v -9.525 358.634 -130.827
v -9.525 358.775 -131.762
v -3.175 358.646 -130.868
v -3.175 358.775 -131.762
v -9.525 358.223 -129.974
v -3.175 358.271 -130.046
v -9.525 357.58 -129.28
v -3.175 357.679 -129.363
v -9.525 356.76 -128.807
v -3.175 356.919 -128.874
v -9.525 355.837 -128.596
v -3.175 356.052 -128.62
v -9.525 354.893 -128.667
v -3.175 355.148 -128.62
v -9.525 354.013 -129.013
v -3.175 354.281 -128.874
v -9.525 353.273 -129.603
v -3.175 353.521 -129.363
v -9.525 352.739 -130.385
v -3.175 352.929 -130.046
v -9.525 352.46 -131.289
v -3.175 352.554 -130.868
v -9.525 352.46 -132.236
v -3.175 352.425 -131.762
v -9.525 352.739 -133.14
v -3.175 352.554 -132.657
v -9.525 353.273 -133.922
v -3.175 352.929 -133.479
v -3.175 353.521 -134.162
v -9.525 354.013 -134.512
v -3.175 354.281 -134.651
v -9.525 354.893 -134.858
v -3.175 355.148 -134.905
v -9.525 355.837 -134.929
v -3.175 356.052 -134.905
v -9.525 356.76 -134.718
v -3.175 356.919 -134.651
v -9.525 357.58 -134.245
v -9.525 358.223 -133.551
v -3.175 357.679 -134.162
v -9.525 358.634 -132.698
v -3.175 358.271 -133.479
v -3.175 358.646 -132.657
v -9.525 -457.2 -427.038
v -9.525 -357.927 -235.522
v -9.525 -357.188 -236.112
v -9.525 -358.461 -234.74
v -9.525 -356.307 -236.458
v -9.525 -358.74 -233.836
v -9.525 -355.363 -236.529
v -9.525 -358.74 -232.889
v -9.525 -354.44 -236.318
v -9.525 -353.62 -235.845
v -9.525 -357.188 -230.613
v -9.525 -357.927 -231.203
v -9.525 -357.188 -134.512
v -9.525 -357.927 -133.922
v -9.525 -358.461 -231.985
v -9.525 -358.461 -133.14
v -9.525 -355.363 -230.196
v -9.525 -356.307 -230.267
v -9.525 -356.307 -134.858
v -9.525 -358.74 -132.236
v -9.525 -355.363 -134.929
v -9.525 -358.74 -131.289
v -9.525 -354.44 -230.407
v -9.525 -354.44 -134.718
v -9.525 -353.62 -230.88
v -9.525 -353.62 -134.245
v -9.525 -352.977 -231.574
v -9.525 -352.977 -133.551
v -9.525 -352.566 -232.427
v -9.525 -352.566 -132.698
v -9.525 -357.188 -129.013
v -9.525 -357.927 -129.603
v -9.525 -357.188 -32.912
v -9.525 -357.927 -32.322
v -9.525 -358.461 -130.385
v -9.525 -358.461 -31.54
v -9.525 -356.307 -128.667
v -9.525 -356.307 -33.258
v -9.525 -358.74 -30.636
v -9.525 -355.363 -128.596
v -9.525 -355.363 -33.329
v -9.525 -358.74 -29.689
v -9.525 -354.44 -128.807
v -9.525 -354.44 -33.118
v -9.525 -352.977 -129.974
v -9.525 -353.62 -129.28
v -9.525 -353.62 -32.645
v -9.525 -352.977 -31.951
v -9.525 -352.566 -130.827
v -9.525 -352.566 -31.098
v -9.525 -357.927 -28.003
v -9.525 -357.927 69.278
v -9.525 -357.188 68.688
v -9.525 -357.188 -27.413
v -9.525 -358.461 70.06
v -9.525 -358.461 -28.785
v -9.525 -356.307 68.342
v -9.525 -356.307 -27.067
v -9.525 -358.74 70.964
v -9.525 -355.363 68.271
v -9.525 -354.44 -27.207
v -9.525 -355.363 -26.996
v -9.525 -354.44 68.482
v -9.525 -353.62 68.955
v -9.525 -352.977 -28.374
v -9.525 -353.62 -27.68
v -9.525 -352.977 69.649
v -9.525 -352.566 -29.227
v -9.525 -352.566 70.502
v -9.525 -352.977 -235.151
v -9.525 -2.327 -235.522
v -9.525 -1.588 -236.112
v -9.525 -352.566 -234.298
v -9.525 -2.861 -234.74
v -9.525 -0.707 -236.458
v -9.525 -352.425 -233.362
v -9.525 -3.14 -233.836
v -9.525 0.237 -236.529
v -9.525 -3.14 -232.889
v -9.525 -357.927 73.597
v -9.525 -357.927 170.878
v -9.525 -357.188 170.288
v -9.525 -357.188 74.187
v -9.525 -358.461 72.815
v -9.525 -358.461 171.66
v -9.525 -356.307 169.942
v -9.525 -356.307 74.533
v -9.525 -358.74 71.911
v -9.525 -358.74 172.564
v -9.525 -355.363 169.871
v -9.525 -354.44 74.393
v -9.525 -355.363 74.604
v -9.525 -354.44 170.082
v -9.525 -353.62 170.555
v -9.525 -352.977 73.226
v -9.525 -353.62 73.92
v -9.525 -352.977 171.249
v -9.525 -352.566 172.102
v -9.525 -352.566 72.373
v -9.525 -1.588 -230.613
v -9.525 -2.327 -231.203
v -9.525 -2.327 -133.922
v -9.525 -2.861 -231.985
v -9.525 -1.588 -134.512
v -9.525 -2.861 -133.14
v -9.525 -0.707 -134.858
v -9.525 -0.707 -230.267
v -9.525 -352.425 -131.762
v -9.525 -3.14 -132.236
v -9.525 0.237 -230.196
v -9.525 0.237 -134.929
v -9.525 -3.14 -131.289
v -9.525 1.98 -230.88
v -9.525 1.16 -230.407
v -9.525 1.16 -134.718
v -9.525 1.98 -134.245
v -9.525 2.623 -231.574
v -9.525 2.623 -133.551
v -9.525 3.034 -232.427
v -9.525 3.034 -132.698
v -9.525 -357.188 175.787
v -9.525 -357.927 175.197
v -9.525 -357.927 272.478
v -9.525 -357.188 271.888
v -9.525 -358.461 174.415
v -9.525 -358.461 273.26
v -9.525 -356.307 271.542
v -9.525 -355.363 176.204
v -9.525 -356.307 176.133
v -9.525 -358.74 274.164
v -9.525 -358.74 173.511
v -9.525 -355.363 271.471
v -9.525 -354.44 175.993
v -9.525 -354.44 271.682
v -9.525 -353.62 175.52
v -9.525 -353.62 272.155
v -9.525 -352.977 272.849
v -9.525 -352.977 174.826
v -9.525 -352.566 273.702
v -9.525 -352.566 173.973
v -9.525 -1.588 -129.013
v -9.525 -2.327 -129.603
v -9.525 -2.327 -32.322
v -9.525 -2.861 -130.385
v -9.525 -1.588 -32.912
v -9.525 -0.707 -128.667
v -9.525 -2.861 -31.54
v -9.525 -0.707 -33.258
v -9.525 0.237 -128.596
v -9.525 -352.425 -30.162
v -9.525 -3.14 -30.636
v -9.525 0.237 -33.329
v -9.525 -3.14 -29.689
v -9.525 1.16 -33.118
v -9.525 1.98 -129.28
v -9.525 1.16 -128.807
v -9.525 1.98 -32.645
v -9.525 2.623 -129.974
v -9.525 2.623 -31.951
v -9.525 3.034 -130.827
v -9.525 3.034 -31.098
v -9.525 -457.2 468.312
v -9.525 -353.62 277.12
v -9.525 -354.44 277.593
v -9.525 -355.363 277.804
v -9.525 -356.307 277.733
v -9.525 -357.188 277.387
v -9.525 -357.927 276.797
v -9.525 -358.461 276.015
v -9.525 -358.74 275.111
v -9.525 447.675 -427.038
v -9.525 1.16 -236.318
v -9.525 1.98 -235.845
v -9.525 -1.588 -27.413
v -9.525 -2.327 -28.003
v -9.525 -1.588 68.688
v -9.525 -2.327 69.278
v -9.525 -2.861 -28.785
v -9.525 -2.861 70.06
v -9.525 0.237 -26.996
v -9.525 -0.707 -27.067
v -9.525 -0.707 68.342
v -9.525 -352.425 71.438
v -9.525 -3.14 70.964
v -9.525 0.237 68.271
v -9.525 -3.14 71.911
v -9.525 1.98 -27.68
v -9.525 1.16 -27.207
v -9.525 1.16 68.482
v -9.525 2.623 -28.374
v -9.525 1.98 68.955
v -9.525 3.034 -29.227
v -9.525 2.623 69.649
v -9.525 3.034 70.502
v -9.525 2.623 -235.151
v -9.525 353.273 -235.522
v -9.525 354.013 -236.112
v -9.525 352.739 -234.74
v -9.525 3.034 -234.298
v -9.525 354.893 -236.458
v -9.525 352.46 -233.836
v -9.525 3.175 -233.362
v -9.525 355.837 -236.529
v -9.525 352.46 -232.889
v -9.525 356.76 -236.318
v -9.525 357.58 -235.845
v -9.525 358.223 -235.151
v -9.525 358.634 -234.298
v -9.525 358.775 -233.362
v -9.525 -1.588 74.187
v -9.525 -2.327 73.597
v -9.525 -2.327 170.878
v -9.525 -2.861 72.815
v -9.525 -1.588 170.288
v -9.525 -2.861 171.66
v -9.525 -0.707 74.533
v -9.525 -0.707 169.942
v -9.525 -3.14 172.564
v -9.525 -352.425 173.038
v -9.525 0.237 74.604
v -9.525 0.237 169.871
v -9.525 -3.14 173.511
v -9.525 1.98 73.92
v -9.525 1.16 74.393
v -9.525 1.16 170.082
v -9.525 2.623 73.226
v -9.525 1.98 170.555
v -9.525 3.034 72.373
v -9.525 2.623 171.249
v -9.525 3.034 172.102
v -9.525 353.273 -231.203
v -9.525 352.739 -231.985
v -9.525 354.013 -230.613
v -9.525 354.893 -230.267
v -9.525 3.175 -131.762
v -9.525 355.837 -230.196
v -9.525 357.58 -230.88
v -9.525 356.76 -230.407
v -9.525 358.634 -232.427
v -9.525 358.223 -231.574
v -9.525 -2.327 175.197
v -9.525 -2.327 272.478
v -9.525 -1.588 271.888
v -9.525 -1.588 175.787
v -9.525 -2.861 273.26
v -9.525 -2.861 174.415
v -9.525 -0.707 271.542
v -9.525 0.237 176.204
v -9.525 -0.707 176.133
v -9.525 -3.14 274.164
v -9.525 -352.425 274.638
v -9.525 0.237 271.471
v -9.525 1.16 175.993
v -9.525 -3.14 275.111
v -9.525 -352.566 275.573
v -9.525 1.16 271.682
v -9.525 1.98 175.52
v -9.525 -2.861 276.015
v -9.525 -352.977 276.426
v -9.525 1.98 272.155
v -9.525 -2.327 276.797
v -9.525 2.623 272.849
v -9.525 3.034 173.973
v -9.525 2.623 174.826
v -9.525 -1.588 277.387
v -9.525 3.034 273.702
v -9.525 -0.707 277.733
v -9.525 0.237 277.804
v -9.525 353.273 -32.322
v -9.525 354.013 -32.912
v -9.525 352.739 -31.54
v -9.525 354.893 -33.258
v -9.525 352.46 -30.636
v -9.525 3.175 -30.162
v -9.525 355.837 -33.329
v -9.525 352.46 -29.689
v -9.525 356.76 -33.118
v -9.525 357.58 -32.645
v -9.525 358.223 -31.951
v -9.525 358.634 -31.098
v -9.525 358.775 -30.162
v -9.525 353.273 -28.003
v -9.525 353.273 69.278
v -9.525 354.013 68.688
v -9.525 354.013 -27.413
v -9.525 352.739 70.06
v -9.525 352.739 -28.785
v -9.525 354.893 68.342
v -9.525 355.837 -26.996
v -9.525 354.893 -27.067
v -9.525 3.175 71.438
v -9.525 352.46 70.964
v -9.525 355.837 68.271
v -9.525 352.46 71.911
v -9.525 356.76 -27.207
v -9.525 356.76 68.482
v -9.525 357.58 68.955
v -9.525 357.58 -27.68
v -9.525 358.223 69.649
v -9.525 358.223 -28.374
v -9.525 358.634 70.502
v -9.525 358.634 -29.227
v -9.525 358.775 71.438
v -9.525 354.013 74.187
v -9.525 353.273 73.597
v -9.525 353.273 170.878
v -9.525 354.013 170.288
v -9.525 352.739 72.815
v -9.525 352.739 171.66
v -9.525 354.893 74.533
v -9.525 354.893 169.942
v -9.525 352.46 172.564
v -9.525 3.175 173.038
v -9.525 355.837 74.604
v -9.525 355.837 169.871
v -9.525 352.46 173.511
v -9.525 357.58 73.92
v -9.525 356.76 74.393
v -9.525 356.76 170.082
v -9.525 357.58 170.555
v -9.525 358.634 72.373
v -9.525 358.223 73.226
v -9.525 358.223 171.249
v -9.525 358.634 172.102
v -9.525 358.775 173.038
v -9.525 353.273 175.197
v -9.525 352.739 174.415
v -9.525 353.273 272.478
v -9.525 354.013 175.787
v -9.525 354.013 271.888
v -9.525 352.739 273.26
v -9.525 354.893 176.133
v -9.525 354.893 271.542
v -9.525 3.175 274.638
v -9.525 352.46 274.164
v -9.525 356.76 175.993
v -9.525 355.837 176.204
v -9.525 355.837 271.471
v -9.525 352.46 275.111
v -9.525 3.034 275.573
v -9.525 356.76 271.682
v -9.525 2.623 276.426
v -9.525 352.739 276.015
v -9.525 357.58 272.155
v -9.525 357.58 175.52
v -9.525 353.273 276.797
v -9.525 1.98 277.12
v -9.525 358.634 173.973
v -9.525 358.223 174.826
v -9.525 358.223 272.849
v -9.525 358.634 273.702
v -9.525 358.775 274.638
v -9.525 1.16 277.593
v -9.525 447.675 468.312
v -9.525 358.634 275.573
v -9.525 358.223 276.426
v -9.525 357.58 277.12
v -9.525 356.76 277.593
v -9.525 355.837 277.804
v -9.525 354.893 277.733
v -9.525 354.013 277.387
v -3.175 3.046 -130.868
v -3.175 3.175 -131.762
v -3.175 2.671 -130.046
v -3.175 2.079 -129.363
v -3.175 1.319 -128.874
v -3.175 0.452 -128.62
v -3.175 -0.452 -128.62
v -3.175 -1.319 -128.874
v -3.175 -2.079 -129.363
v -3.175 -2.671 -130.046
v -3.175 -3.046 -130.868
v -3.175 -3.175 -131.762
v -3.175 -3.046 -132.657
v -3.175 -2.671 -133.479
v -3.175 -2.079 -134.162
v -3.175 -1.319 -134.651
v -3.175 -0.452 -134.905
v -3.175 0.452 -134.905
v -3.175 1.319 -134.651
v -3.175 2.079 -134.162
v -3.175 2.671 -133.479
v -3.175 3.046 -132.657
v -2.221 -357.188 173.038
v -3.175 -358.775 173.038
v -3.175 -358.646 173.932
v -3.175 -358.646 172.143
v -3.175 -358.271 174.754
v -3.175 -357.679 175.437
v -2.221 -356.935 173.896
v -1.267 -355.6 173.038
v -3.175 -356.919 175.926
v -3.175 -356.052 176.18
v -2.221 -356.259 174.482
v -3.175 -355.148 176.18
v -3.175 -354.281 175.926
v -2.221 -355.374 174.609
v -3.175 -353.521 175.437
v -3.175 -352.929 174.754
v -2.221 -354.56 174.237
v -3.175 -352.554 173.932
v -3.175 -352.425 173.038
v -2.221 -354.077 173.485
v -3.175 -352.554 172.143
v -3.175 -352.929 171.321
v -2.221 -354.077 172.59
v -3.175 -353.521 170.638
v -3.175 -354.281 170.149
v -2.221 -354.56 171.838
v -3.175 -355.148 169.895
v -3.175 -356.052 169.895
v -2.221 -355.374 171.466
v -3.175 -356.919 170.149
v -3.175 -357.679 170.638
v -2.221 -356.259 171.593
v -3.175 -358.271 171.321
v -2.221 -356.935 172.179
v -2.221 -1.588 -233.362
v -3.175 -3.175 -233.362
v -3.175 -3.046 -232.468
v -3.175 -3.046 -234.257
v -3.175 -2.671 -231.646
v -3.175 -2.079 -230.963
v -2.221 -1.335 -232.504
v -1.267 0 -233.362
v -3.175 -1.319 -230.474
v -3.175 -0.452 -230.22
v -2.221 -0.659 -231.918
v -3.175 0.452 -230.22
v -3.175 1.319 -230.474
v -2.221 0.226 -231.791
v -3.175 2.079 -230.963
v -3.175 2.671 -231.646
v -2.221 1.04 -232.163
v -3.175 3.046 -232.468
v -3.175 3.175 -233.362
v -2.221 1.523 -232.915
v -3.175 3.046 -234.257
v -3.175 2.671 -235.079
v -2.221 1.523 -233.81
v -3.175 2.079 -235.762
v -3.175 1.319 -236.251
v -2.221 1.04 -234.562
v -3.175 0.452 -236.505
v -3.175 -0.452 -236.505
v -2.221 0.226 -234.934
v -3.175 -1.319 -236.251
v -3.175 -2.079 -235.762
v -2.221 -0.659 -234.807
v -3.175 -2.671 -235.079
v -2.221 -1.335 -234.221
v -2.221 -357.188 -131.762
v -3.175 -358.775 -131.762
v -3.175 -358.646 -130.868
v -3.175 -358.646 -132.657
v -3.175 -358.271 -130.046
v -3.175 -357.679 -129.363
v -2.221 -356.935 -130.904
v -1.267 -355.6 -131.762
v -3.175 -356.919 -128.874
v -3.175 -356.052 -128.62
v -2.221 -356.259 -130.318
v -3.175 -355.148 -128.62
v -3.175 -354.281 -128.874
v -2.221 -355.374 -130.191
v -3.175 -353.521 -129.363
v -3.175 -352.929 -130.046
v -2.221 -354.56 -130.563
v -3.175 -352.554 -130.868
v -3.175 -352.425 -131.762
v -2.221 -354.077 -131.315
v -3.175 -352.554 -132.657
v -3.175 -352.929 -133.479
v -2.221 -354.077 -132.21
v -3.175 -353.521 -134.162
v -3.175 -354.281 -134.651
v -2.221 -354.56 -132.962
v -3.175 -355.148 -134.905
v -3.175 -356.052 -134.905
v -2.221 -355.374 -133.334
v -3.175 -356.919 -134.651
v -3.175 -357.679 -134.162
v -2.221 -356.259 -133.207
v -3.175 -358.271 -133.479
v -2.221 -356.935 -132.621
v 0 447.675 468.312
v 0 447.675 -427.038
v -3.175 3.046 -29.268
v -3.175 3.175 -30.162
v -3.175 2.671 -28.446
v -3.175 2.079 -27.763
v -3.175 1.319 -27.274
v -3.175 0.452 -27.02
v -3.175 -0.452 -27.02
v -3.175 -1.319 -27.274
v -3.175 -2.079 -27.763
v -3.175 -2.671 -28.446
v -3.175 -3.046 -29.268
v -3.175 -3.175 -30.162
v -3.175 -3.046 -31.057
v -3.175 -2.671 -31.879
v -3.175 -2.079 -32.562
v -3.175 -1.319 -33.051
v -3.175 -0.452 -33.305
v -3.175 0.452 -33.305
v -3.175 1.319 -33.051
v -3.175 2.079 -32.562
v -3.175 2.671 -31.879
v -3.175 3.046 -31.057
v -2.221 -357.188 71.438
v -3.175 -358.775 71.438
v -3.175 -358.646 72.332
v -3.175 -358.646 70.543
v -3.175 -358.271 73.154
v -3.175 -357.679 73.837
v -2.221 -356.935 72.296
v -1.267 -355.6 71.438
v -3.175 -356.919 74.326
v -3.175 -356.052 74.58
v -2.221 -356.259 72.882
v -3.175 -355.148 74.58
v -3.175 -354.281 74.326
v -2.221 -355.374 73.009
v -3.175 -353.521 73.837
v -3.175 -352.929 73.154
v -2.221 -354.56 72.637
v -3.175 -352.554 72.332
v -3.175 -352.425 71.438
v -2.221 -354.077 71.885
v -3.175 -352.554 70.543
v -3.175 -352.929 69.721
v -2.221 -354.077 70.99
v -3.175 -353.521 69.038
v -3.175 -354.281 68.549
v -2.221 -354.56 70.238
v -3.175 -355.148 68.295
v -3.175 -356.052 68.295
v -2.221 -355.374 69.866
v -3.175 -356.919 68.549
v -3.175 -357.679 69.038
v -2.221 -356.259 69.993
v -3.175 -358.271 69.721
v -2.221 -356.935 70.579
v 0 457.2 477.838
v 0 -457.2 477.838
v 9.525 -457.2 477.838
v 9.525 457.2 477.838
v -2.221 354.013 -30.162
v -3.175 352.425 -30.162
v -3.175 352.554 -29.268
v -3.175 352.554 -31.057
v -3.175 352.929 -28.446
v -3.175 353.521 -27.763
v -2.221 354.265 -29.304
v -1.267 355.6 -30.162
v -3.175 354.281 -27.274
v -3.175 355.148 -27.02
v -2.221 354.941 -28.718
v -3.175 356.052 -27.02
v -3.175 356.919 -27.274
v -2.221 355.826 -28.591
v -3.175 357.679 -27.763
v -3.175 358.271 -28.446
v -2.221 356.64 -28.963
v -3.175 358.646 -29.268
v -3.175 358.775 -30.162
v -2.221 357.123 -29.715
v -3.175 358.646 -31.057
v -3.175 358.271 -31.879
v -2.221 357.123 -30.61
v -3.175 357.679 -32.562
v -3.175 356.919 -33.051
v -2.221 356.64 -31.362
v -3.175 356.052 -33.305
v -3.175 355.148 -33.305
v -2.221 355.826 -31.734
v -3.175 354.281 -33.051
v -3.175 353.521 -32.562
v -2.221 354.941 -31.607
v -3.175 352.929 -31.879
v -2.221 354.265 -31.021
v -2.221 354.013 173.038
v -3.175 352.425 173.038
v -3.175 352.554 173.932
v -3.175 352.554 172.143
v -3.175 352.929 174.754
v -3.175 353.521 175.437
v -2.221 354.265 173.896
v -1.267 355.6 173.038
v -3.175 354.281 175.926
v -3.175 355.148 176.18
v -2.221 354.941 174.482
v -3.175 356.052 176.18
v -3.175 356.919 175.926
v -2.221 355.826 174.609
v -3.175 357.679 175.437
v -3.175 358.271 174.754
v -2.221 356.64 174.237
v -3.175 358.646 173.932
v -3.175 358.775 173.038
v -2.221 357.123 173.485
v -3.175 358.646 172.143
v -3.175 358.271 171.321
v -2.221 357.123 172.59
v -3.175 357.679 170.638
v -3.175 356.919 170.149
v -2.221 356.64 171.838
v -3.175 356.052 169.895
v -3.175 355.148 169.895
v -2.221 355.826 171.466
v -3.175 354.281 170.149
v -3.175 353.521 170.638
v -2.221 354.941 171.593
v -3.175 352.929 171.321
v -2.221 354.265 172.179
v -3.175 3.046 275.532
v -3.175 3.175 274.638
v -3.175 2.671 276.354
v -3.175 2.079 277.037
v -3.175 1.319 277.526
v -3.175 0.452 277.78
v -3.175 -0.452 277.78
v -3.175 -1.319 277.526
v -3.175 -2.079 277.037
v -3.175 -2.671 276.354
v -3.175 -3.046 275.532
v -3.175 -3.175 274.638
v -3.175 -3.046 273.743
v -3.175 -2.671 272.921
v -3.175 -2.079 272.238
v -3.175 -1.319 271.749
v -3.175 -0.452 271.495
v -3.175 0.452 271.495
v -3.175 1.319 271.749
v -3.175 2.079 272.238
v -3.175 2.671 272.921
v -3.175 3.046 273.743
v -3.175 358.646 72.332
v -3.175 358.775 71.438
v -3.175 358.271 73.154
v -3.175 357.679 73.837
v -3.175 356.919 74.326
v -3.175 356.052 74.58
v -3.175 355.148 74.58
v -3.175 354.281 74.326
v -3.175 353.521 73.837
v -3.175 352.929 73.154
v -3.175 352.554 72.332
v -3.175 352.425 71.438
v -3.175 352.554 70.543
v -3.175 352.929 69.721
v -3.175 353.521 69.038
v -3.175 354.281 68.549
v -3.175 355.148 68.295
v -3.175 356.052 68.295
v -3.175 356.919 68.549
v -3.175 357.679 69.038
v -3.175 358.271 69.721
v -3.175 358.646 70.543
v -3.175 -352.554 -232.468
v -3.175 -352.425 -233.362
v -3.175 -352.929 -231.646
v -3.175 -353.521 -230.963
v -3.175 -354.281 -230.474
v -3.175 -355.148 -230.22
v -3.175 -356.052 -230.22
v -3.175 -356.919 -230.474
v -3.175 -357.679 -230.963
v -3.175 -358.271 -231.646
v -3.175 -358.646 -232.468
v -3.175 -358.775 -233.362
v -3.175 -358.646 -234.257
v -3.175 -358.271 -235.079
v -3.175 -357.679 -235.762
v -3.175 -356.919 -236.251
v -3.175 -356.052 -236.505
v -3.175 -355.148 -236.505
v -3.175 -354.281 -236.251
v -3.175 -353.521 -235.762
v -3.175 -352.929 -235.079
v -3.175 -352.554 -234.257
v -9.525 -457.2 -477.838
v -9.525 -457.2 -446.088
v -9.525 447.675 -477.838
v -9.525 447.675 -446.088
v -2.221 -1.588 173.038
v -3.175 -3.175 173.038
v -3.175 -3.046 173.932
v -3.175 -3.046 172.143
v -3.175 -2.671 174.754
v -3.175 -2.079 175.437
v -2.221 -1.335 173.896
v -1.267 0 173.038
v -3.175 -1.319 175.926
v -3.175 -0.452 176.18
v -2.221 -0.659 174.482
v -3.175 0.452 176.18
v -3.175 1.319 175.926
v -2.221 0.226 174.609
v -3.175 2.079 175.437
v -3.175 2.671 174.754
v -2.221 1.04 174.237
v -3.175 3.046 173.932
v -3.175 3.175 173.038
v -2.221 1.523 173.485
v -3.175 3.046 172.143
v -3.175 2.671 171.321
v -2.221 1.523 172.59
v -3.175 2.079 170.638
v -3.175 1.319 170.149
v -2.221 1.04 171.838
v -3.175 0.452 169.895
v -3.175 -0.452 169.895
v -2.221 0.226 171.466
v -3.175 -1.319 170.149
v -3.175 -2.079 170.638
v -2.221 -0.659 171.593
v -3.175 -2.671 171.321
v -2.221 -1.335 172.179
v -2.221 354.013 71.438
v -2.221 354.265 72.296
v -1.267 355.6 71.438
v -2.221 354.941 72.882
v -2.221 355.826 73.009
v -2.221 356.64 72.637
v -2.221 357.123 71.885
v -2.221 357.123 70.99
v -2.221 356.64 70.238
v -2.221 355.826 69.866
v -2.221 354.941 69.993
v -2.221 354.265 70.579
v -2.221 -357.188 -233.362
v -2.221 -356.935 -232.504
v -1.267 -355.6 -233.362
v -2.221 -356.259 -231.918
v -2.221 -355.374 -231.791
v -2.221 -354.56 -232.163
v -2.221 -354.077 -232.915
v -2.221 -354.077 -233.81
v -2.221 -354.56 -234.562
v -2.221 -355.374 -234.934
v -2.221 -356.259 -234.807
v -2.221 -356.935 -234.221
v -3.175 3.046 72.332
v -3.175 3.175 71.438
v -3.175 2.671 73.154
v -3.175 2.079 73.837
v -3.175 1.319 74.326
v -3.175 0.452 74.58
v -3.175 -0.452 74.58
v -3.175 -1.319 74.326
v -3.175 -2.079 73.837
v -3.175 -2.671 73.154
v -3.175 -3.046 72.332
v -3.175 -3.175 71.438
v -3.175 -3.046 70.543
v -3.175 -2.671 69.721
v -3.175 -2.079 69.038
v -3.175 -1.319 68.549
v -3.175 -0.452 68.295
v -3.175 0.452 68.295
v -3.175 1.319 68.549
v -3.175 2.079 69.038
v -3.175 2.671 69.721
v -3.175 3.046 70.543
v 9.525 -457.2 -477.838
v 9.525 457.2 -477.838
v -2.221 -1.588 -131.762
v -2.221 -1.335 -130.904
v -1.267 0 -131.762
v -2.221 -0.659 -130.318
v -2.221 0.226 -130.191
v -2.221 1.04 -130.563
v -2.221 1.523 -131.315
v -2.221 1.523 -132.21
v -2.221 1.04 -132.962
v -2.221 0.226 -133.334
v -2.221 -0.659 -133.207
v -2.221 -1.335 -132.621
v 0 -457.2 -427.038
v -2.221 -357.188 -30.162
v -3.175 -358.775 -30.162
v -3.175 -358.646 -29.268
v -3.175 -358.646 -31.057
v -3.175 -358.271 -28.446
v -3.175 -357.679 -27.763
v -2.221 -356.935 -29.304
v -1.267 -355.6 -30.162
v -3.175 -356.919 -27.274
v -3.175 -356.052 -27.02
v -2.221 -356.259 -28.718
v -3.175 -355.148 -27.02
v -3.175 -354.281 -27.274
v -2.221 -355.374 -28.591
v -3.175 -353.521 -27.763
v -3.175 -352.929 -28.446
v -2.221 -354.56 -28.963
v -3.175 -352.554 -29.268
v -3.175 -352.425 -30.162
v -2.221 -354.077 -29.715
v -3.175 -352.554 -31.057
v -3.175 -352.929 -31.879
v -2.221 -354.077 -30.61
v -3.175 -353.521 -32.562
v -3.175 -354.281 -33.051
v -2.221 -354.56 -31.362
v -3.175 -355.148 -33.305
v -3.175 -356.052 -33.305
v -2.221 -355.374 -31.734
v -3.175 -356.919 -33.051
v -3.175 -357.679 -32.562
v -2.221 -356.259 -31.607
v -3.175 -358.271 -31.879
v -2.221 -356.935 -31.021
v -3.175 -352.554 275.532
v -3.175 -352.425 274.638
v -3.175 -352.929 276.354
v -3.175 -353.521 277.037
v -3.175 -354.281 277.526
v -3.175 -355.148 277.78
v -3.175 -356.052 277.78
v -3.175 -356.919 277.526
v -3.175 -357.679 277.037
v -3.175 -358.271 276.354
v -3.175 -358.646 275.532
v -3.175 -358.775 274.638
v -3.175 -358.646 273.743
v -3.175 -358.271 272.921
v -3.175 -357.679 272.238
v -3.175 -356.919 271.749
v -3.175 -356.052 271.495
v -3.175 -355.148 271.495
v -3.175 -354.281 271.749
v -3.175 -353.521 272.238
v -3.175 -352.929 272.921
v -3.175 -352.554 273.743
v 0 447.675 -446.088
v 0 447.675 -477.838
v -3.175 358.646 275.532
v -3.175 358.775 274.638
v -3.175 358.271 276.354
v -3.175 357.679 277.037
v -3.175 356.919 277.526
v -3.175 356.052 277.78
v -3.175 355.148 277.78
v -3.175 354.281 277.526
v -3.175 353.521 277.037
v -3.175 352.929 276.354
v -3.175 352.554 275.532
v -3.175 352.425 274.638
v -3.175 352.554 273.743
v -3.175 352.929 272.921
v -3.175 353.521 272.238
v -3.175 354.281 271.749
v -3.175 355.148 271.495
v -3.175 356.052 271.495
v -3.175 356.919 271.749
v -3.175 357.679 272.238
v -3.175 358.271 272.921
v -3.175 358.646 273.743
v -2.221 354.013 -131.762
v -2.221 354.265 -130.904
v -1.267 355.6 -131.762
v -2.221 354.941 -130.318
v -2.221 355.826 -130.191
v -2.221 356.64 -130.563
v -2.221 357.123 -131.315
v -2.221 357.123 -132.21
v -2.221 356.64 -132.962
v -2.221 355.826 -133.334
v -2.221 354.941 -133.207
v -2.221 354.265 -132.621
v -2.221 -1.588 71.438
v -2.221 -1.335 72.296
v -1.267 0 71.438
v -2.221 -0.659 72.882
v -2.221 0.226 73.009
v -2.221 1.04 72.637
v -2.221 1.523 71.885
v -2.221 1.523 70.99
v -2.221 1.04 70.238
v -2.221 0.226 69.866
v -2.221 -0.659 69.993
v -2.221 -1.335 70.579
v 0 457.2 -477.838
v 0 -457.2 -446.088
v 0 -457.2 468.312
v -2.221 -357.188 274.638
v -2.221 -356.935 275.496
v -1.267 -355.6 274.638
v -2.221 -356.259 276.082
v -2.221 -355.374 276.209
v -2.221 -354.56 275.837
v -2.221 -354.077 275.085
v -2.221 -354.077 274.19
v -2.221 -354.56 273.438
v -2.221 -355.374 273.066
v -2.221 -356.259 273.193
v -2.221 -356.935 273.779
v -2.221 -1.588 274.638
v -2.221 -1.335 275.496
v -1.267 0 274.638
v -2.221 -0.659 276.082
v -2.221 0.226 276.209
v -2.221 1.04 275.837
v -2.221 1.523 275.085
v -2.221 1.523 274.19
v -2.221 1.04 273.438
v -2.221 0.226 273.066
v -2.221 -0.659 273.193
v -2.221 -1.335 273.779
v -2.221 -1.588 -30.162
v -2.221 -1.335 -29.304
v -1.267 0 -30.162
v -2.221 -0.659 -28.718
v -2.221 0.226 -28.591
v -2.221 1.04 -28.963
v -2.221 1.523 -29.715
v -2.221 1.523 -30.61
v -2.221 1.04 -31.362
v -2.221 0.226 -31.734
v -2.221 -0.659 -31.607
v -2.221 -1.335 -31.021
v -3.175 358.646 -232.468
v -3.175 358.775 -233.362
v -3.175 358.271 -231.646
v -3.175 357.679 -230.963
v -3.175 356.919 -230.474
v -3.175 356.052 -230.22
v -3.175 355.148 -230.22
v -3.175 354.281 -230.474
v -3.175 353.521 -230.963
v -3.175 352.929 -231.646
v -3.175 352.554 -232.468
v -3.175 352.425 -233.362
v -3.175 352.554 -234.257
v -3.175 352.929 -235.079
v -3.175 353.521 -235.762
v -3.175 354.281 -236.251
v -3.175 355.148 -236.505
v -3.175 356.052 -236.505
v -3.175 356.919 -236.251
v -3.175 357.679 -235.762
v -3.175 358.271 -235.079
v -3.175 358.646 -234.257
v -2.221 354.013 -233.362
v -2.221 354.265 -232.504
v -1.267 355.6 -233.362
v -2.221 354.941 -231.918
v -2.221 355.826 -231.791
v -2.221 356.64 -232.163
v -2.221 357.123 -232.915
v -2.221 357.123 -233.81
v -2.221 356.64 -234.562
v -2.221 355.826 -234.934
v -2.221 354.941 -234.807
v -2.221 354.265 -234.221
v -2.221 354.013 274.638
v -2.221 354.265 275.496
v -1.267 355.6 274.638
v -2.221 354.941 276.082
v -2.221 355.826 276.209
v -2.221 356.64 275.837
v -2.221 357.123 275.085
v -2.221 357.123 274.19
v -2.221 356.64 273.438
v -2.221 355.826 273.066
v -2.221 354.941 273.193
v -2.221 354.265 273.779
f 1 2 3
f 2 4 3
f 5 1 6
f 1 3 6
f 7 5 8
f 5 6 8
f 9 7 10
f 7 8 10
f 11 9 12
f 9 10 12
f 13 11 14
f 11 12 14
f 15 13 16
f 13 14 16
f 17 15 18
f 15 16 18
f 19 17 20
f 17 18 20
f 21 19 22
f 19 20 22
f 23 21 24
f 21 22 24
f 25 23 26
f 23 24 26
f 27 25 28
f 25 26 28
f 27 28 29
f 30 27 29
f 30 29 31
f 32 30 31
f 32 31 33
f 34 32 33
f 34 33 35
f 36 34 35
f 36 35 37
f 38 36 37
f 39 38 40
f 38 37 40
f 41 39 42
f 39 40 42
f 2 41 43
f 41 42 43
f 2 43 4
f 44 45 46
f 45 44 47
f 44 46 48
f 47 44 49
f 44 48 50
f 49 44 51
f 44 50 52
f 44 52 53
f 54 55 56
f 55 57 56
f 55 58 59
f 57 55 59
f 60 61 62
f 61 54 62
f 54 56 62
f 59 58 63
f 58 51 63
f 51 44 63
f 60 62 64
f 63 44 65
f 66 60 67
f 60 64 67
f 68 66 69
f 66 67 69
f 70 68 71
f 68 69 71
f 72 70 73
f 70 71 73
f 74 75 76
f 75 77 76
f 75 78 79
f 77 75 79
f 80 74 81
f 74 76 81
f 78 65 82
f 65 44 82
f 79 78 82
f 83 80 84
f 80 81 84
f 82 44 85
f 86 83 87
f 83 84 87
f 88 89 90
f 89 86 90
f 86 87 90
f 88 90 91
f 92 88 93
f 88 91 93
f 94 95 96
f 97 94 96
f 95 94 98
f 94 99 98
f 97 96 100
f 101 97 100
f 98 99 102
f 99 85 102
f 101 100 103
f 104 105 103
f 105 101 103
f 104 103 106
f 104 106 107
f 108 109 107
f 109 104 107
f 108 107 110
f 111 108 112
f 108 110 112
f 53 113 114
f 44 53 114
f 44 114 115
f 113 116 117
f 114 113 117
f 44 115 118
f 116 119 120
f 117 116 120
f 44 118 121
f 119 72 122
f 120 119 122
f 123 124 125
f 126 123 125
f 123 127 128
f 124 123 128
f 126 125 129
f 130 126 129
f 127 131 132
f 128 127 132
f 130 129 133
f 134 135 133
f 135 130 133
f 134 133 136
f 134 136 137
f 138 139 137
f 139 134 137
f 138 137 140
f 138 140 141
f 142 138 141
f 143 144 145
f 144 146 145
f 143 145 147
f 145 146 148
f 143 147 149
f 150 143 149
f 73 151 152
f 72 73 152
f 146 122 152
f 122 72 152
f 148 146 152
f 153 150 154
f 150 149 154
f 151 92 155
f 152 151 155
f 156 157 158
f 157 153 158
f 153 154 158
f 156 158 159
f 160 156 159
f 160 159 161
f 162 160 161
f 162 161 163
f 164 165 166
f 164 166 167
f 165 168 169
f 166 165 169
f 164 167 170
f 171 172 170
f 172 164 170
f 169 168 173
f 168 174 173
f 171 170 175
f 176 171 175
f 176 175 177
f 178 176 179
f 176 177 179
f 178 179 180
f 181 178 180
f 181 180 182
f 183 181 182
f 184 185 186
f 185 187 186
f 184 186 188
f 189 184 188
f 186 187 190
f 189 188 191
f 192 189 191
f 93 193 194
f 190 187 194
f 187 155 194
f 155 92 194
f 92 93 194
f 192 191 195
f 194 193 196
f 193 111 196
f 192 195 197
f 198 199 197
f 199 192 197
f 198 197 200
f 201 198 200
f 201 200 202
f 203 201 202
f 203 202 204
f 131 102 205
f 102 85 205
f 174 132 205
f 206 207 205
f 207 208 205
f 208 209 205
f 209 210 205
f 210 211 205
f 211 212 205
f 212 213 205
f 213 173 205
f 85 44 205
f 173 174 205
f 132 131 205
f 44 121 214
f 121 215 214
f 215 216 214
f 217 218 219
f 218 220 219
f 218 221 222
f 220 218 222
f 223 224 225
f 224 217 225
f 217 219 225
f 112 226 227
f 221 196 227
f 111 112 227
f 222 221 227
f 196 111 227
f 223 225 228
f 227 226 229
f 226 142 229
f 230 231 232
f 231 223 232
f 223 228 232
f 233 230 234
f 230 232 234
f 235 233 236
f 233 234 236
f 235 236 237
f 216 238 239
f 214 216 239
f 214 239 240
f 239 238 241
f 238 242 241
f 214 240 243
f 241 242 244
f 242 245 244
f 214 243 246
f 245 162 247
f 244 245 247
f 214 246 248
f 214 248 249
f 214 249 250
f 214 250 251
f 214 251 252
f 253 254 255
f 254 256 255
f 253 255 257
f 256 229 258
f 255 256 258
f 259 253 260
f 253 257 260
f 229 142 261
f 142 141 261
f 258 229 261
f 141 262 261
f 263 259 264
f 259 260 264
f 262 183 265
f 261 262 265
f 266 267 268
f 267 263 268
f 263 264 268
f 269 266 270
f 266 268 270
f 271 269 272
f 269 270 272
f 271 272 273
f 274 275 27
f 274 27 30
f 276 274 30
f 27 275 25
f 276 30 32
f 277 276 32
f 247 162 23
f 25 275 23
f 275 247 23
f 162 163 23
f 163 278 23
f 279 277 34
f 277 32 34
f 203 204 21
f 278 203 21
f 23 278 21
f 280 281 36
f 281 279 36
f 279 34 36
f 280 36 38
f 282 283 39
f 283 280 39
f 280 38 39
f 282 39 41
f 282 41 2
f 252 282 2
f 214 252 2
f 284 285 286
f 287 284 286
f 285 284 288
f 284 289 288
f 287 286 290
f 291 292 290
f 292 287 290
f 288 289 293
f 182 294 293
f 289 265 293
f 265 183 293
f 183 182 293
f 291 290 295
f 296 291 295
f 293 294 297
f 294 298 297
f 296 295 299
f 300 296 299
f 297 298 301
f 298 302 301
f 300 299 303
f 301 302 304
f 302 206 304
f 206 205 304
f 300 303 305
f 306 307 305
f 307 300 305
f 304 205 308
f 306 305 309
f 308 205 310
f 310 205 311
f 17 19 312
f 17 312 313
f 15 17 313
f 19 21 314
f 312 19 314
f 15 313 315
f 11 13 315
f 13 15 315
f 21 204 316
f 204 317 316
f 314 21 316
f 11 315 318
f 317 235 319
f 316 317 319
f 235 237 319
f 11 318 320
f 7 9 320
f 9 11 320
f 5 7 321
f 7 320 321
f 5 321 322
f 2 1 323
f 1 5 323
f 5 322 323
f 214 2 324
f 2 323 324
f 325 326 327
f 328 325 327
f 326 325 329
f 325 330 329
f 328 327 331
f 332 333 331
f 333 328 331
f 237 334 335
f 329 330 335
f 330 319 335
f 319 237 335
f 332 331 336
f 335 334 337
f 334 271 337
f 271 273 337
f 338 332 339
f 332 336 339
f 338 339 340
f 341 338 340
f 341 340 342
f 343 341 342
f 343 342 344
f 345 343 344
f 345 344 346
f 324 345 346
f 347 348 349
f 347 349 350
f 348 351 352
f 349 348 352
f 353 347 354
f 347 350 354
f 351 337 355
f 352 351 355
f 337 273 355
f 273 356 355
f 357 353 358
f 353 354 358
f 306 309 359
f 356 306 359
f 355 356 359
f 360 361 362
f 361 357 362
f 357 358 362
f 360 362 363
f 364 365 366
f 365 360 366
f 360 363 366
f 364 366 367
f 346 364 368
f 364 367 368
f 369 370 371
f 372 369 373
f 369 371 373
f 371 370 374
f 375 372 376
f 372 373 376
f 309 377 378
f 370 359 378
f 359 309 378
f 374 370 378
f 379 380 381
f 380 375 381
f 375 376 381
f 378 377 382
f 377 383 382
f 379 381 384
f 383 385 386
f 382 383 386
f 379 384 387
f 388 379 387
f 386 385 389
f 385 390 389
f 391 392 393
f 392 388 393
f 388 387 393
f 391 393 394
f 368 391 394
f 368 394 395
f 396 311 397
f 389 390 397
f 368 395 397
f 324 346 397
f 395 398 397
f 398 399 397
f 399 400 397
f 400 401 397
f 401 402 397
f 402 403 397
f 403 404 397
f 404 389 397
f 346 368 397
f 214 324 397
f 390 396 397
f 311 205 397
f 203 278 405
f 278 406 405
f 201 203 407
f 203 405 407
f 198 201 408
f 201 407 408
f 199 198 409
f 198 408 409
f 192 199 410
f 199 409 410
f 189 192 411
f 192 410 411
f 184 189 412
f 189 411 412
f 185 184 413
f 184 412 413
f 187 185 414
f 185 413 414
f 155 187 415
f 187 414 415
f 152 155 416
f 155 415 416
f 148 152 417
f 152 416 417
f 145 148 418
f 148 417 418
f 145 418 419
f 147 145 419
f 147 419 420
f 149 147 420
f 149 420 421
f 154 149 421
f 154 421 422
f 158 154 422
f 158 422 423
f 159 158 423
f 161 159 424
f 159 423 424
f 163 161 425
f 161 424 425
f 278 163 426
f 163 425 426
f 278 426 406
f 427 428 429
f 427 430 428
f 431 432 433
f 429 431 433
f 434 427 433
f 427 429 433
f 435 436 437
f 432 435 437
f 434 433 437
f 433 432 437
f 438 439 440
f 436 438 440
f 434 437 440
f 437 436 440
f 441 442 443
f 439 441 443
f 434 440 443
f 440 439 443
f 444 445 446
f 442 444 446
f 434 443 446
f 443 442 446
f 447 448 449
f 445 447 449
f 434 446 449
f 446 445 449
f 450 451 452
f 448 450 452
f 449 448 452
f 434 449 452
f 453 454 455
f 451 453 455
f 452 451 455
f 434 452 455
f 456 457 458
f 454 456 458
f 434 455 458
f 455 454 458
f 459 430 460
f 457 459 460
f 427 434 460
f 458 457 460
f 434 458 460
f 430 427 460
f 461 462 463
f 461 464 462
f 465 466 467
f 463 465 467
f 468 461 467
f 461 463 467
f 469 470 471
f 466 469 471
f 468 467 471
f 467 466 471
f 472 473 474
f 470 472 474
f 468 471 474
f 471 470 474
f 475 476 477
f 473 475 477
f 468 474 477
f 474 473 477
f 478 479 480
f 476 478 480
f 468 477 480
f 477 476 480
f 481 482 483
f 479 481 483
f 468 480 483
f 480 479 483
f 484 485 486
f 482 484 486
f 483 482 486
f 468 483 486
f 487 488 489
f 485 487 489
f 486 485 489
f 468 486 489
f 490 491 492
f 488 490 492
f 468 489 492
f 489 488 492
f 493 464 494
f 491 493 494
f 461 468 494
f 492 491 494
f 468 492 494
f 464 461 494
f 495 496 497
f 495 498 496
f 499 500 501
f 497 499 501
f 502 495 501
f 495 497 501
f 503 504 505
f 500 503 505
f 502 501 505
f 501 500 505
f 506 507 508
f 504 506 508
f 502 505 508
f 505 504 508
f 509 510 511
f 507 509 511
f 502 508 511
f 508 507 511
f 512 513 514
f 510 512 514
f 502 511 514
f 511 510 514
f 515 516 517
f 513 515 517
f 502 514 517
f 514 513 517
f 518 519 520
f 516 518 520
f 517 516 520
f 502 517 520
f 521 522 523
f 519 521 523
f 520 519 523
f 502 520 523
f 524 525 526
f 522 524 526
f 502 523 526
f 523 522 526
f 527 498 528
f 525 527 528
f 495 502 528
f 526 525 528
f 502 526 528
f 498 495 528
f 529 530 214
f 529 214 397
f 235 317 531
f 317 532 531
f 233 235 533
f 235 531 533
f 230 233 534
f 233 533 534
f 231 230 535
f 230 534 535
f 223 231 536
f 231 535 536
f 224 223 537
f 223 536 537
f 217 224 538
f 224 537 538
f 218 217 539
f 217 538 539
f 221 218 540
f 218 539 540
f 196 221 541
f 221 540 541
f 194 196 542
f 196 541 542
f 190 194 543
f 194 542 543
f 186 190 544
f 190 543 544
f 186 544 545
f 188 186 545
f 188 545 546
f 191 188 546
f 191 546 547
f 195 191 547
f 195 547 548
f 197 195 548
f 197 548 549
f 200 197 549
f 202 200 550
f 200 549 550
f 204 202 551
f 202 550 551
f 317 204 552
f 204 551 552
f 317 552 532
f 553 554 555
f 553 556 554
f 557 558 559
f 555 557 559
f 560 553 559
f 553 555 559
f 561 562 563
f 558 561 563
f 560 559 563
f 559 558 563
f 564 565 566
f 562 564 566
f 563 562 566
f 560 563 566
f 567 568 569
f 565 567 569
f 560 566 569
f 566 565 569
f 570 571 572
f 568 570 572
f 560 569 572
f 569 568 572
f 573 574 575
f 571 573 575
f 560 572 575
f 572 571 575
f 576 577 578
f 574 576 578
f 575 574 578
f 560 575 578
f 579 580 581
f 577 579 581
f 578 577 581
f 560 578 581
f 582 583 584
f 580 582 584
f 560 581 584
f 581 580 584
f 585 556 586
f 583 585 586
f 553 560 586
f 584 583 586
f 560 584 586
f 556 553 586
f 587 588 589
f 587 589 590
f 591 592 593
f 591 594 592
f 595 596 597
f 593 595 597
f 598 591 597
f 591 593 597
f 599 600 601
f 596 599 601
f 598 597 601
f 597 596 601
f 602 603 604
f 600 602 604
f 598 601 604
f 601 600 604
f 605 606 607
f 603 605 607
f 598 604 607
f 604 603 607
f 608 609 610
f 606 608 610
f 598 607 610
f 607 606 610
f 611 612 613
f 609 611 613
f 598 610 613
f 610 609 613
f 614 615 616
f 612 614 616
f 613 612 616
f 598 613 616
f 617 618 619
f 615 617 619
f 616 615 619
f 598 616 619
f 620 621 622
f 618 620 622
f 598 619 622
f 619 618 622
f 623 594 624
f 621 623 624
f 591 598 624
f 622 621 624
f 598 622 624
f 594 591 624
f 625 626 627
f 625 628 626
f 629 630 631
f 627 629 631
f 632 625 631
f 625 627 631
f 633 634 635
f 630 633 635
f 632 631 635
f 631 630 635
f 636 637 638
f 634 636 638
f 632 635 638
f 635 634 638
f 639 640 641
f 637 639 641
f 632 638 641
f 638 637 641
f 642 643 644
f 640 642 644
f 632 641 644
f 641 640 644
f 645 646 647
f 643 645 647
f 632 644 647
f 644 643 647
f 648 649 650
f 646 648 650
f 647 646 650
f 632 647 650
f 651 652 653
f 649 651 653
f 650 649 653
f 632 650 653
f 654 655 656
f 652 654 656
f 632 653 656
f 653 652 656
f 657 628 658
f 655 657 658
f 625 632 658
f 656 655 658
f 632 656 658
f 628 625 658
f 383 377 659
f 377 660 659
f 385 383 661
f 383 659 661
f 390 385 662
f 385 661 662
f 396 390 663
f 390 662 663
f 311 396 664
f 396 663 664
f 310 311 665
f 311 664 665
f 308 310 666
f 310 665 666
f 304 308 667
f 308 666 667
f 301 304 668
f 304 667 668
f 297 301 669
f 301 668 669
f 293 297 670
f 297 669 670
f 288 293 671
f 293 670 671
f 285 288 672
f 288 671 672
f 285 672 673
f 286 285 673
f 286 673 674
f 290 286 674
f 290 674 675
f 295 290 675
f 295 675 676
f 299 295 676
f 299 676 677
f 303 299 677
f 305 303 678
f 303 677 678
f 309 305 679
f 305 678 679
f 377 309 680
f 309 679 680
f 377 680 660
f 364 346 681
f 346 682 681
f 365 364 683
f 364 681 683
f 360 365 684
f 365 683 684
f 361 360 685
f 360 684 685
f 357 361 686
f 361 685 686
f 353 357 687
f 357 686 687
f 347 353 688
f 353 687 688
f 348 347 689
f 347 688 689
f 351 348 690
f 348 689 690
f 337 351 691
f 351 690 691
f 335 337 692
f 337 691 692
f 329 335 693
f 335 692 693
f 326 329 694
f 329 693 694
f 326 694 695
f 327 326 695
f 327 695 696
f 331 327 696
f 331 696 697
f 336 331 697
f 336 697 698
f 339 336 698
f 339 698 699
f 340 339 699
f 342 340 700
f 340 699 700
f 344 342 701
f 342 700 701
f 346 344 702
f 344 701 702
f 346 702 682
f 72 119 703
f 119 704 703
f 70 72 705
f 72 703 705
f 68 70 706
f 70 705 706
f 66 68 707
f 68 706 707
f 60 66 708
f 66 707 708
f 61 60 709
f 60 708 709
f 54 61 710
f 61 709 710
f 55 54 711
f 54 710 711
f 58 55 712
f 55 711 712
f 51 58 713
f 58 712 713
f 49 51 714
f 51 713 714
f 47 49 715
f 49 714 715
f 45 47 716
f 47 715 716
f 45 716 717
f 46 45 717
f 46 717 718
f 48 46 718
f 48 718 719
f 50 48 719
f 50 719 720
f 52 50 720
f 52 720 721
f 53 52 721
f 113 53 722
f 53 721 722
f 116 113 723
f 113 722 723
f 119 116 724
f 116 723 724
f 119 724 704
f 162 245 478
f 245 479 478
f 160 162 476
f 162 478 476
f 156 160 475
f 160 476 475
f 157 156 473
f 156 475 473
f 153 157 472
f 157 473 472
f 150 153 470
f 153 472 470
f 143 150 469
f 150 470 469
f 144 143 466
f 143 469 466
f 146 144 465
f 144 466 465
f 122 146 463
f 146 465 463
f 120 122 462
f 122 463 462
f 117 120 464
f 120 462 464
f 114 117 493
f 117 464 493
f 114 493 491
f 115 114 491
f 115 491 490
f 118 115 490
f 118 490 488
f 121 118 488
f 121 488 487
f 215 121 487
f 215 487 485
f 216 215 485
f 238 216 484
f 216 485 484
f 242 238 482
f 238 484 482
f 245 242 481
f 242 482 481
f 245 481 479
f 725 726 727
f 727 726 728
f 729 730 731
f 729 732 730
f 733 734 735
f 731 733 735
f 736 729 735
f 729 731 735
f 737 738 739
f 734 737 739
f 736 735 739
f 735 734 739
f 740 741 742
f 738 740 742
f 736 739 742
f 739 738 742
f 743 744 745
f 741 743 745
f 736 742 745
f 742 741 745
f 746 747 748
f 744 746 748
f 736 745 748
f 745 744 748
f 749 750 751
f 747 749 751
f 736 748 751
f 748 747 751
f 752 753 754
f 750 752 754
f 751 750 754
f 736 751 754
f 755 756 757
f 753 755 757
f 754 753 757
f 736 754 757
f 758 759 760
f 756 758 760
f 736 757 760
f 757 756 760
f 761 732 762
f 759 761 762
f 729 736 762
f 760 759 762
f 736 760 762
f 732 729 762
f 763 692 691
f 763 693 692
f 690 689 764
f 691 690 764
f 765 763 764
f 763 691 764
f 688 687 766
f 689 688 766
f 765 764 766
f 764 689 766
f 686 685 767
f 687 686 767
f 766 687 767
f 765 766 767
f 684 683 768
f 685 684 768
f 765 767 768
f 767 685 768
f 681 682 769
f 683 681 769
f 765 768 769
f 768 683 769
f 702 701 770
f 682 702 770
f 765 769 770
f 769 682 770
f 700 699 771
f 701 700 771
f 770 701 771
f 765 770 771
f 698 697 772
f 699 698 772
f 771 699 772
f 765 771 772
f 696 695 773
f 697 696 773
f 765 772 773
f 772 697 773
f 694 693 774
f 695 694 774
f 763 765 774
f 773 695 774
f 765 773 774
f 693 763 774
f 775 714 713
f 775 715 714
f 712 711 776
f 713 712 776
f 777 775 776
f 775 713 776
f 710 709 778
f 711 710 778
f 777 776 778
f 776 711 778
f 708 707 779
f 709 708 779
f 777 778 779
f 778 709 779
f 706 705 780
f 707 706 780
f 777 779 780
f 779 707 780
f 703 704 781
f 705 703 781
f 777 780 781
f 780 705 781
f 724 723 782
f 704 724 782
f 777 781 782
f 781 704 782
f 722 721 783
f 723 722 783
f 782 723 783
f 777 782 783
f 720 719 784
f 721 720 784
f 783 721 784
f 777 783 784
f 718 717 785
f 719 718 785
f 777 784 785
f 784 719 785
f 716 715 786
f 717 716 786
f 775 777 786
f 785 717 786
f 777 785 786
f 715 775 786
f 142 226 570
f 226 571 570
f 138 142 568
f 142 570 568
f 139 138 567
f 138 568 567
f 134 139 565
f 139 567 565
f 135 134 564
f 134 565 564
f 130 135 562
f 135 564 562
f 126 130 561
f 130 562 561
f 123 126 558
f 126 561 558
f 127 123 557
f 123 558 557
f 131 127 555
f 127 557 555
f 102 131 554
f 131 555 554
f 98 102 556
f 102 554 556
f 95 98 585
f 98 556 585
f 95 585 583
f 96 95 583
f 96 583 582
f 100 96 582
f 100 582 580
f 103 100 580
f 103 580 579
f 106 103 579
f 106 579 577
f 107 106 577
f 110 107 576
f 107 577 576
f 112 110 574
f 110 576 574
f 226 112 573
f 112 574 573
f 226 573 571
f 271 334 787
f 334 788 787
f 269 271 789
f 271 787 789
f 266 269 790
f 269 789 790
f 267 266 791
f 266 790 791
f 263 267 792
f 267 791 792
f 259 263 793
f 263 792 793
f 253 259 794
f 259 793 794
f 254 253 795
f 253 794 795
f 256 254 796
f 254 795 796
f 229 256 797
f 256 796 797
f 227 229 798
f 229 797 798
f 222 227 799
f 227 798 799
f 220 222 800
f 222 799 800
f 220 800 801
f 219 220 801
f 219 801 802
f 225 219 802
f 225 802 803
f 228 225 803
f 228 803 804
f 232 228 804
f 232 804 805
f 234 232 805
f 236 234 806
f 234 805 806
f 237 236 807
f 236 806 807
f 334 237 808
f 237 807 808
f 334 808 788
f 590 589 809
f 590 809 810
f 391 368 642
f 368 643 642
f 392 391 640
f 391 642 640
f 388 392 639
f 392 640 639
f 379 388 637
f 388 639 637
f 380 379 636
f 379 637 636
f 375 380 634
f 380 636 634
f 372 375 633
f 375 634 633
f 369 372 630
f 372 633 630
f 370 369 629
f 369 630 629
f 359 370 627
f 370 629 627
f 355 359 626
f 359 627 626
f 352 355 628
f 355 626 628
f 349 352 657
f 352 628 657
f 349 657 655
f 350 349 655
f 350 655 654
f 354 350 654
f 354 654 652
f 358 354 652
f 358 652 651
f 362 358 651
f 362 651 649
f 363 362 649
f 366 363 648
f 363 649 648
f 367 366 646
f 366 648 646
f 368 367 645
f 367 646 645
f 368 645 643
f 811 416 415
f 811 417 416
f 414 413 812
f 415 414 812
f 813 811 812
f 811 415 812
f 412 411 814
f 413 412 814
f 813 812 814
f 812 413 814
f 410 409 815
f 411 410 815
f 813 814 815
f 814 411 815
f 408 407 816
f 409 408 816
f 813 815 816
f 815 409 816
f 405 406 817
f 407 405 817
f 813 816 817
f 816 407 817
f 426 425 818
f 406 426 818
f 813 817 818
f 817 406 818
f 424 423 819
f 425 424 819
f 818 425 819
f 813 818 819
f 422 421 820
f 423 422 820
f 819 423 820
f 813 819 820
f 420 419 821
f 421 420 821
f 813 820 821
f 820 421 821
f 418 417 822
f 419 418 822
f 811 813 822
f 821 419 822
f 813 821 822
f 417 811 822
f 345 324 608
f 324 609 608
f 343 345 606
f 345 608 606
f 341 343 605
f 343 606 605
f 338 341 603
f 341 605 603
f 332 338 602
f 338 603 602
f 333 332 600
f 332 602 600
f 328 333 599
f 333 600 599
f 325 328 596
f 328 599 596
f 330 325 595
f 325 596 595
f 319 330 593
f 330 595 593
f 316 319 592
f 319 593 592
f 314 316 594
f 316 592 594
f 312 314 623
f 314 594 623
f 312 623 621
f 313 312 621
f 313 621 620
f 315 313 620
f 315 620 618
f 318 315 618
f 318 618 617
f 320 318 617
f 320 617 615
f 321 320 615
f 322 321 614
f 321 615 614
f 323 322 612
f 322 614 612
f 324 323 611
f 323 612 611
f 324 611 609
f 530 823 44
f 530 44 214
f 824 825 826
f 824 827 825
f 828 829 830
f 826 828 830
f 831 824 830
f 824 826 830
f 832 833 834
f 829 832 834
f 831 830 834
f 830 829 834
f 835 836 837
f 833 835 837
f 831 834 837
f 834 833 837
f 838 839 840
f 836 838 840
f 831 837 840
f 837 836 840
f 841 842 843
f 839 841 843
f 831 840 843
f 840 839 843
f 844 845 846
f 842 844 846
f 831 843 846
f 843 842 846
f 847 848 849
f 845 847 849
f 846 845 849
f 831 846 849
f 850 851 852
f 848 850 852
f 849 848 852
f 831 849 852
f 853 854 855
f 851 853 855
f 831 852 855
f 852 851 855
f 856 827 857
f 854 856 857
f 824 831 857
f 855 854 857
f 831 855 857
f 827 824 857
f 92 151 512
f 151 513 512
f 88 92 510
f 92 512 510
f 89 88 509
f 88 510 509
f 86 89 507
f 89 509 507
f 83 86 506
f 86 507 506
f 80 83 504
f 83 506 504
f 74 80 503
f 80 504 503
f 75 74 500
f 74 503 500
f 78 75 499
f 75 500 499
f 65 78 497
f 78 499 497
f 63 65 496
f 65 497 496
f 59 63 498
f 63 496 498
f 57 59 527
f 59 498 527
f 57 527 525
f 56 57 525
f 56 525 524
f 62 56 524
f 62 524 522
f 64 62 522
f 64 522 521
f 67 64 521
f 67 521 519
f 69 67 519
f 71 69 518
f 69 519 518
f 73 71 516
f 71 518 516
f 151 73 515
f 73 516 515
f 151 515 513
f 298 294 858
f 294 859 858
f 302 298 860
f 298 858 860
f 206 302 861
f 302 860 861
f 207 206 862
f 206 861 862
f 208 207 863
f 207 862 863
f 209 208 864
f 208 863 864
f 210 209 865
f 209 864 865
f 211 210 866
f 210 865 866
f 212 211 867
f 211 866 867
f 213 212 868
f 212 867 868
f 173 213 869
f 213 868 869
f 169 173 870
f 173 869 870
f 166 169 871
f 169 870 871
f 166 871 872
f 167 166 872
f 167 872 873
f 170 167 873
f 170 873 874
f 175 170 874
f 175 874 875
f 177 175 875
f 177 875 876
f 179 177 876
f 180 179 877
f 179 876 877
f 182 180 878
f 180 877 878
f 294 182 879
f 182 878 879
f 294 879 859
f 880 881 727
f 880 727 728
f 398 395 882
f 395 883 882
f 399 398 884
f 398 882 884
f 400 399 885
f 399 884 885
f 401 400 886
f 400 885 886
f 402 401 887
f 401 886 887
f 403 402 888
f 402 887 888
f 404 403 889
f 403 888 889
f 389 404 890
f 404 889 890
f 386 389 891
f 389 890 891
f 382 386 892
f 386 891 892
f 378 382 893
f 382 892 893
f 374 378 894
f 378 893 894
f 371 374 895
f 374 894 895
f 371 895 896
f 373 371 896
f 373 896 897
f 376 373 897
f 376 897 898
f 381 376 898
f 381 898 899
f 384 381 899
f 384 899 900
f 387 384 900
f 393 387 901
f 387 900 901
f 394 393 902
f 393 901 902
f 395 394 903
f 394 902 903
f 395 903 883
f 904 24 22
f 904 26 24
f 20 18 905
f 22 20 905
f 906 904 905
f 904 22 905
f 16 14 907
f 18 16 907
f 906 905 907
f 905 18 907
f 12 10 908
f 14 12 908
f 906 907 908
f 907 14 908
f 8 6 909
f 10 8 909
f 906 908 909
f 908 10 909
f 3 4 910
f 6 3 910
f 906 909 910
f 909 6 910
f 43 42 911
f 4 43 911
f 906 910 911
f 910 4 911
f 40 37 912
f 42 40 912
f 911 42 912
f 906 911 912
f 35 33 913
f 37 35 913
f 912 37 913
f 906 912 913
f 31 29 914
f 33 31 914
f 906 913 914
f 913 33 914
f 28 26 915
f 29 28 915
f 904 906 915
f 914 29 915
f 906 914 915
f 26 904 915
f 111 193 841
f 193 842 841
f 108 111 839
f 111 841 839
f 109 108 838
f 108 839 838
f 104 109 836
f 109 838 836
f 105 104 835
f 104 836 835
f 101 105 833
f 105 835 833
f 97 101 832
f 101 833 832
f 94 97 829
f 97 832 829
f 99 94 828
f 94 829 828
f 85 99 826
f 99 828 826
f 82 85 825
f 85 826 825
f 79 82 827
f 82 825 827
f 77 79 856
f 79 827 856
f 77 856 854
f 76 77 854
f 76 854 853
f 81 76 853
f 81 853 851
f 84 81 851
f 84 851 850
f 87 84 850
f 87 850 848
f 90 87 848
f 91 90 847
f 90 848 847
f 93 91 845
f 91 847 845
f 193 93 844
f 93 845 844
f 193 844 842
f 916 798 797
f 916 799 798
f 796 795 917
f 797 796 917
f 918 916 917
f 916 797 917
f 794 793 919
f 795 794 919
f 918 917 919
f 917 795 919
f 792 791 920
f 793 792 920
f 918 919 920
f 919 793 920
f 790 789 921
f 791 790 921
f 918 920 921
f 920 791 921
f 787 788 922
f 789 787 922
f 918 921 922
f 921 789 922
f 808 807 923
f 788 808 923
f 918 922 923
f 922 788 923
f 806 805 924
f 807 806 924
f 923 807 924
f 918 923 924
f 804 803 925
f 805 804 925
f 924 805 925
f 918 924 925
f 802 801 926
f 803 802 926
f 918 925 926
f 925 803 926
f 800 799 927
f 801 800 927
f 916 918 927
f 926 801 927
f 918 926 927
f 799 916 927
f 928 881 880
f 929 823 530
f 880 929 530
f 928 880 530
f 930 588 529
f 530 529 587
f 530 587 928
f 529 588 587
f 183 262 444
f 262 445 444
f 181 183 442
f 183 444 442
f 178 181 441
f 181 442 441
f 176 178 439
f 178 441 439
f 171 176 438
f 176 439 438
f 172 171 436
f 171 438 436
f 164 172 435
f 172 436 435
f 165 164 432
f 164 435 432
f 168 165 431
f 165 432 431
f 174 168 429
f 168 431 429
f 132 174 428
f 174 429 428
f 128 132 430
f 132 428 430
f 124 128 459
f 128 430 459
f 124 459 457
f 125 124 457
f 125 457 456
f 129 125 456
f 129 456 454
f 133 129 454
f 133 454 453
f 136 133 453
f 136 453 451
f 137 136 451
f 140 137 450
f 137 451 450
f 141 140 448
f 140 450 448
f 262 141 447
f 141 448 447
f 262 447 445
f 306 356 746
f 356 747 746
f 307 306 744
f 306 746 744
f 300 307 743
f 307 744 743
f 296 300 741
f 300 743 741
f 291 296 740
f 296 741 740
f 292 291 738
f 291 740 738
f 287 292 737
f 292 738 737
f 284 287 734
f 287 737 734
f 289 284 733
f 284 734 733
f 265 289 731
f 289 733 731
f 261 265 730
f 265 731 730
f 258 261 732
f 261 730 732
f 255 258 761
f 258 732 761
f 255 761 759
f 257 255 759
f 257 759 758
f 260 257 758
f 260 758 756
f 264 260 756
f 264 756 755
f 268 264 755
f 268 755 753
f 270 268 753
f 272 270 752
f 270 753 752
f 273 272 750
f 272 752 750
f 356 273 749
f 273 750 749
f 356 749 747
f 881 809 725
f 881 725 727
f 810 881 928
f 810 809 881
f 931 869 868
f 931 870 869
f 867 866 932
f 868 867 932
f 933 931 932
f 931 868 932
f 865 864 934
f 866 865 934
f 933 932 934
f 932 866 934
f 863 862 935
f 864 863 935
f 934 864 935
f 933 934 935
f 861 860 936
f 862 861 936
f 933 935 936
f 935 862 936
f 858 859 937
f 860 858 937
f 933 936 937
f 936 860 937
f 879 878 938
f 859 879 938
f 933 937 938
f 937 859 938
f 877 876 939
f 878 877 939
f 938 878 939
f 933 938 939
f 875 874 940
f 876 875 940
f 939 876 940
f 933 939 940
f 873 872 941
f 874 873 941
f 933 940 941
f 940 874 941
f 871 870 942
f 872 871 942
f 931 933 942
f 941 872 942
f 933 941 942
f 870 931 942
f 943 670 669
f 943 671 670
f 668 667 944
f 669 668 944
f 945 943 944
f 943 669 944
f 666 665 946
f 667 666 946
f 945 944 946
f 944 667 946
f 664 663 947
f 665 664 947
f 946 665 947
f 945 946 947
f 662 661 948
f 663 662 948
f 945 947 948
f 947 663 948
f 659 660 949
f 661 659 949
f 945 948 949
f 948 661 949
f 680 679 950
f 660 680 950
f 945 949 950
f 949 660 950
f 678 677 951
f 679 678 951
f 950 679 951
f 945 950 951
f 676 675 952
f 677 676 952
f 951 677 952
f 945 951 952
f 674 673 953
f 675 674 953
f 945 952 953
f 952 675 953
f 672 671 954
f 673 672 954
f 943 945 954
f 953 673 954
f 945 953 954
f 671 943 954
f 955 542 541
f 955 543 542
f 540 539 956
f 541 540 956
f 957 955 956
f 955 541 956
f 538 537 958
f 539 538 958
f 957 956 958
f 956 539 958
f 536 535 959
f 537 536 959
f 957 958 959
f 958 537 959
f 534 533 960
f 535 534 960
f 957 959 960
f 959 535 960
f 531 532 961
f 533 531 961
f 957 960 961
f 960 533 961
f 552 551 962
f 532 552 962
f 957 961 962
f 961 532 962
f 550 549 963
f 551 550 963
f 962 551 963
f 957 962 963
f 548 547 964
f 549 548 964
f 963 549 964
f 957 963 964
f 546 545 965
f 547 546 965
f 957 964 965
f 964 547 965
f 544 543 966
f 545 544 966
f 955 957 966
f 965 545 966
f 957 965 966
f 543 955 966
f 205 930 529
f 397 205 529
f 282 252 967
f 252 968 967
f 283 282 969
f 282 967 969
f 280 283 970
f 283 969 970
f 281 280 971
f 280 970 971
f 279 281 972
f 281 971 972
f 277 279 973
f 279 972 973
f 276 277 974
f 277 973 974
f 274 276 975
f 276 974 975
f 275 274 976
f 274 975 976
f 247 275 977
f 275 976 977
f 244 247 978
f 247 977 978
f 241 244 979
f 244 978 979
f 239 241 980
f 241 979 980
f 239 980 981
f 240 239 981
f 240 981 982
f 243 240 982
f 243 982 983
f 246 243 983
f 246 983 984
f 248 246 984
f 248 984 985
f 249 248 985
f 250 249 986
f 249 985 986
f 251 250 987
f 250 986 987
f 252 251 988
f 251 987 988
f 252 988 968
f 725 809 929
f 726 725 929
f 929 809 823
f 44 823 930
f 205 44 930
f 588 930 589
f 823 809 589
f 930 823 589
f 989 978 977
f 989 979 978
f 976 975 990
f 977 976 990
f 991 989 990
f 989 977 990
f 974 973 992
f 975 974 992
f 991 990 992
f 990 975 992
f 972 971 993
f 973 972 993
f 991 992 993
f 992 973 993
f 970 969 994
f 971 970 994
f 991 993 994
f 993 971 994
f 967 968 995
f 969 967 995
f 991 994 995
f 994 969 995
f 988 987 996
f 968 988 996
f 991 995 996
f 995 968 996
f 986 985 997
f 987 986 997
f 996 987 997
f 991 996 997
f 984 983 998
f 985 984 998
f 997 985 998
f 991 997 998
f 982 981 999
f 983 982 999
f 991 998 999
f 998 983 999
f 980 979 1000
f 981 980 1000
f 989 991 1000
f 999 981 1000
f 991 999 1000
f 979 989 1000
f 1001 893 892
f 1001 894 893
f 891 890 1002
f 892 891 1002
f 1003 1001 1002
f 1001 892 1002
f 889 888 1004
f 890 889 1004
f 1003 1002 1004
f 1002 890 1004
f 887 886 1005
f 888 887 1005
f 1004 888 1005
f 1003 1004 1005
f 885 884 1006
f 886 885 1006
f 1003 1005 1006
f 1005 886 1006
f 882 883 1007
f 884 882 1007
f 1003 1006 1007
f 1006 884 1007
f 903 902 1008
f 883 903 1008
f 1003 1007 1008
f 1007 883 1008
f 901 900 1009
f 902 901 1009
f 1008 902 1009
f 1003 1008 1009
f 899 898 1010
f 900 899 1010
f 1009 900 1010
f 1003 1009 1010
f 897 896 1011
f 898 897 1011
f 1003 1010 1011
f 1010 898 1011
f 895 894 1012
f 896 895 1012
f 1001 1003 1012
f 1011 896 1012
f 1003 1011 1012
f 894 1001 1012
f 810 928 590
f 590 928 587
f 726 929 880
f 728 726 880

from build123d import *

# Parameters (mm, degrees)
F0_W     = 914.4
F0_H     = 955.675
F2_DEPTH = 9.525
F1_W     = 904.875
F1_H     = 895.35
F1_H_2   = 31.75
F3_DEPTH = 9.525
F5_D     = 6.35
F5_DEPTH = 6.35
F5_TIP   = 1.9077324654


with BuildPart() as f2:
    # F0 (on Right) → F2 (new body)
    with BuildSketch(Plane.YZ):
        Rectangle(F0_W, F0_H)
    extrude(amount=F2_DEPTH)

    # F1 (on face) → F3 (join)
    with BuildSketch(Plane.YZ):
        with Locations((-4.7625, 20.6375)):
            Rectangle(F1_W, F1_H)
        with Locations((-4.7625, -461.9625)):
            Rectangle(F1_W, F1_H_2)
    extrude(amount=-F3_DEPTH)

    # F5
    with Locations(Plane(origin=(-9.525, 0, 0), x_dir=(0, -1, 0), z_dir=(-1, 0, 0))):
        with Locations((-355.6, 274.6375), (355.6, -233.3625), (-355.6, -30.1625), (355.6, 71.4375), (355.6, -30.1625), (0, -30.1625), (0, -233.3625), (355.6, 274.6375), (0, -131.7625), (0, 71.4375), (-355.6, 71.4375), (-355.6, -131.7625), (0, 274.6375), (-355.6, 173.0375), (355.6, 173.0375), (0, 173.0375), (355.6, -131.7625), (-355.6, -233.3625)):
            Hole(F5_D / 2, depth=F5_DEPTH)
            with Locations((0, 0, -(F5_DEPTH + F5_TIP / 2))):  # 118° drill point
                Cone(0, F5_D / 2, F5_TIP, mode=Mode.SUBTRACT)


solid = f2.part
